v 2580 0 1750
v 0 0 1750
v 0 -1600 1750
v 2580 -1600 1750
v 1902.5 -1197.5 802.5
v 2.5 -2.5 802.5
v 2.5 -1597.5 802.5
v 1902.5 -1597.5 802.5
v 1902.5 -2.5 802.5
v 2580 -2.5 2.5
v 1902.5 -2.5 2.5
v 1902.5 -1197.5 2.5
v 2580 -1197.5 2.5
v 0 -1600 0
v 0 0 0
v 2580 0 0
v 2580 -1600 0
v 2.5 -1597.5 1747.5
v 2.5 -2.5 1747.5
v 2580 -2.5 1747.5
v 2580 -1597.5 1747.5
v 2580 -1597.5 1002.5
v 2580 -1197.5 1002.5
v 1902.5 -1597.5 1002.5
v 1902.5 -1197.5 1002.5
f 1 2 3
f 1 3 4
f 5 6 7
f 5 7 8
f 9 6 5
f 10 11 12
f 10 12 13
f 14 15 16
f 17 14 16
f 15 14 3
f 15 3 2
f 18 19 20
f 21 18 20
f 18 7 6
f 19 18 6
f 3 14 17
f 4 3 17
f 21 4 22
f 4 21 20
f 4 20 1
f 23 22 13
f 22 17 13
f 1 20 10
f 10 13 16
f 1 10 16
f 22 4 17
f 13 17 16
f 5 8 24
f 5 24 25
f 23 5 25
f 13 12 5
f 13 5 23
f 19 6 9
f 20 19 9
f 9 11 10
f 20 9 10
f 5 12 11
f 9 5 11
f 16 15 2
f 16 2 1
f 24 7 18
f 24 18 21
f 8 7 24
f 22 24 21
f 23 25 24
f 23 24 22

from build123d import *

# Parameters (mm, degrees)
F0_W     = 2580
F0_H     = 1600
F1_DEPTH = 1750
F2_T     = -2.5
F3_W     = 1900
F3_H     = 1595
F4_DEPTH = 800
F5_W     = 677.5
F5_H     = 400
F6_DEPTH = 1000


with BuildPart() as f1:
    # F0 (on Top) → F1 (new body)
    with BuildSketch(Plane.XY):
        with Locations((1290, -800)):
            Rectangle(F0_W, F0_H)
    extrude(amount=F1_DEPTH)

    # F2
    f2_openings = [f1.faces().sort_by_distance(p)[0] for p in [
        (2580, -800, 875),
    ]]
    offset(amount=F2_T, openings=f2_openings)

    # F3 (on face) → F4 (join)
    with BuildSketch(Plane.XY.offset(2.5)):
        with Locations((952.5, -800)):
            Rectangle(F3_W, F3_H)
    extrude(amount=F4_DEPTH)

    # F5 (on face) → F6 (join)
    with BuildSketch(Plane.XY.offset(2.5)):
        with Locations((2241.25, -1397.5)):
            Rectangle(F5_W, F5_H)
    extrude(amount=F6_DEPTH)


solid = f1.part
